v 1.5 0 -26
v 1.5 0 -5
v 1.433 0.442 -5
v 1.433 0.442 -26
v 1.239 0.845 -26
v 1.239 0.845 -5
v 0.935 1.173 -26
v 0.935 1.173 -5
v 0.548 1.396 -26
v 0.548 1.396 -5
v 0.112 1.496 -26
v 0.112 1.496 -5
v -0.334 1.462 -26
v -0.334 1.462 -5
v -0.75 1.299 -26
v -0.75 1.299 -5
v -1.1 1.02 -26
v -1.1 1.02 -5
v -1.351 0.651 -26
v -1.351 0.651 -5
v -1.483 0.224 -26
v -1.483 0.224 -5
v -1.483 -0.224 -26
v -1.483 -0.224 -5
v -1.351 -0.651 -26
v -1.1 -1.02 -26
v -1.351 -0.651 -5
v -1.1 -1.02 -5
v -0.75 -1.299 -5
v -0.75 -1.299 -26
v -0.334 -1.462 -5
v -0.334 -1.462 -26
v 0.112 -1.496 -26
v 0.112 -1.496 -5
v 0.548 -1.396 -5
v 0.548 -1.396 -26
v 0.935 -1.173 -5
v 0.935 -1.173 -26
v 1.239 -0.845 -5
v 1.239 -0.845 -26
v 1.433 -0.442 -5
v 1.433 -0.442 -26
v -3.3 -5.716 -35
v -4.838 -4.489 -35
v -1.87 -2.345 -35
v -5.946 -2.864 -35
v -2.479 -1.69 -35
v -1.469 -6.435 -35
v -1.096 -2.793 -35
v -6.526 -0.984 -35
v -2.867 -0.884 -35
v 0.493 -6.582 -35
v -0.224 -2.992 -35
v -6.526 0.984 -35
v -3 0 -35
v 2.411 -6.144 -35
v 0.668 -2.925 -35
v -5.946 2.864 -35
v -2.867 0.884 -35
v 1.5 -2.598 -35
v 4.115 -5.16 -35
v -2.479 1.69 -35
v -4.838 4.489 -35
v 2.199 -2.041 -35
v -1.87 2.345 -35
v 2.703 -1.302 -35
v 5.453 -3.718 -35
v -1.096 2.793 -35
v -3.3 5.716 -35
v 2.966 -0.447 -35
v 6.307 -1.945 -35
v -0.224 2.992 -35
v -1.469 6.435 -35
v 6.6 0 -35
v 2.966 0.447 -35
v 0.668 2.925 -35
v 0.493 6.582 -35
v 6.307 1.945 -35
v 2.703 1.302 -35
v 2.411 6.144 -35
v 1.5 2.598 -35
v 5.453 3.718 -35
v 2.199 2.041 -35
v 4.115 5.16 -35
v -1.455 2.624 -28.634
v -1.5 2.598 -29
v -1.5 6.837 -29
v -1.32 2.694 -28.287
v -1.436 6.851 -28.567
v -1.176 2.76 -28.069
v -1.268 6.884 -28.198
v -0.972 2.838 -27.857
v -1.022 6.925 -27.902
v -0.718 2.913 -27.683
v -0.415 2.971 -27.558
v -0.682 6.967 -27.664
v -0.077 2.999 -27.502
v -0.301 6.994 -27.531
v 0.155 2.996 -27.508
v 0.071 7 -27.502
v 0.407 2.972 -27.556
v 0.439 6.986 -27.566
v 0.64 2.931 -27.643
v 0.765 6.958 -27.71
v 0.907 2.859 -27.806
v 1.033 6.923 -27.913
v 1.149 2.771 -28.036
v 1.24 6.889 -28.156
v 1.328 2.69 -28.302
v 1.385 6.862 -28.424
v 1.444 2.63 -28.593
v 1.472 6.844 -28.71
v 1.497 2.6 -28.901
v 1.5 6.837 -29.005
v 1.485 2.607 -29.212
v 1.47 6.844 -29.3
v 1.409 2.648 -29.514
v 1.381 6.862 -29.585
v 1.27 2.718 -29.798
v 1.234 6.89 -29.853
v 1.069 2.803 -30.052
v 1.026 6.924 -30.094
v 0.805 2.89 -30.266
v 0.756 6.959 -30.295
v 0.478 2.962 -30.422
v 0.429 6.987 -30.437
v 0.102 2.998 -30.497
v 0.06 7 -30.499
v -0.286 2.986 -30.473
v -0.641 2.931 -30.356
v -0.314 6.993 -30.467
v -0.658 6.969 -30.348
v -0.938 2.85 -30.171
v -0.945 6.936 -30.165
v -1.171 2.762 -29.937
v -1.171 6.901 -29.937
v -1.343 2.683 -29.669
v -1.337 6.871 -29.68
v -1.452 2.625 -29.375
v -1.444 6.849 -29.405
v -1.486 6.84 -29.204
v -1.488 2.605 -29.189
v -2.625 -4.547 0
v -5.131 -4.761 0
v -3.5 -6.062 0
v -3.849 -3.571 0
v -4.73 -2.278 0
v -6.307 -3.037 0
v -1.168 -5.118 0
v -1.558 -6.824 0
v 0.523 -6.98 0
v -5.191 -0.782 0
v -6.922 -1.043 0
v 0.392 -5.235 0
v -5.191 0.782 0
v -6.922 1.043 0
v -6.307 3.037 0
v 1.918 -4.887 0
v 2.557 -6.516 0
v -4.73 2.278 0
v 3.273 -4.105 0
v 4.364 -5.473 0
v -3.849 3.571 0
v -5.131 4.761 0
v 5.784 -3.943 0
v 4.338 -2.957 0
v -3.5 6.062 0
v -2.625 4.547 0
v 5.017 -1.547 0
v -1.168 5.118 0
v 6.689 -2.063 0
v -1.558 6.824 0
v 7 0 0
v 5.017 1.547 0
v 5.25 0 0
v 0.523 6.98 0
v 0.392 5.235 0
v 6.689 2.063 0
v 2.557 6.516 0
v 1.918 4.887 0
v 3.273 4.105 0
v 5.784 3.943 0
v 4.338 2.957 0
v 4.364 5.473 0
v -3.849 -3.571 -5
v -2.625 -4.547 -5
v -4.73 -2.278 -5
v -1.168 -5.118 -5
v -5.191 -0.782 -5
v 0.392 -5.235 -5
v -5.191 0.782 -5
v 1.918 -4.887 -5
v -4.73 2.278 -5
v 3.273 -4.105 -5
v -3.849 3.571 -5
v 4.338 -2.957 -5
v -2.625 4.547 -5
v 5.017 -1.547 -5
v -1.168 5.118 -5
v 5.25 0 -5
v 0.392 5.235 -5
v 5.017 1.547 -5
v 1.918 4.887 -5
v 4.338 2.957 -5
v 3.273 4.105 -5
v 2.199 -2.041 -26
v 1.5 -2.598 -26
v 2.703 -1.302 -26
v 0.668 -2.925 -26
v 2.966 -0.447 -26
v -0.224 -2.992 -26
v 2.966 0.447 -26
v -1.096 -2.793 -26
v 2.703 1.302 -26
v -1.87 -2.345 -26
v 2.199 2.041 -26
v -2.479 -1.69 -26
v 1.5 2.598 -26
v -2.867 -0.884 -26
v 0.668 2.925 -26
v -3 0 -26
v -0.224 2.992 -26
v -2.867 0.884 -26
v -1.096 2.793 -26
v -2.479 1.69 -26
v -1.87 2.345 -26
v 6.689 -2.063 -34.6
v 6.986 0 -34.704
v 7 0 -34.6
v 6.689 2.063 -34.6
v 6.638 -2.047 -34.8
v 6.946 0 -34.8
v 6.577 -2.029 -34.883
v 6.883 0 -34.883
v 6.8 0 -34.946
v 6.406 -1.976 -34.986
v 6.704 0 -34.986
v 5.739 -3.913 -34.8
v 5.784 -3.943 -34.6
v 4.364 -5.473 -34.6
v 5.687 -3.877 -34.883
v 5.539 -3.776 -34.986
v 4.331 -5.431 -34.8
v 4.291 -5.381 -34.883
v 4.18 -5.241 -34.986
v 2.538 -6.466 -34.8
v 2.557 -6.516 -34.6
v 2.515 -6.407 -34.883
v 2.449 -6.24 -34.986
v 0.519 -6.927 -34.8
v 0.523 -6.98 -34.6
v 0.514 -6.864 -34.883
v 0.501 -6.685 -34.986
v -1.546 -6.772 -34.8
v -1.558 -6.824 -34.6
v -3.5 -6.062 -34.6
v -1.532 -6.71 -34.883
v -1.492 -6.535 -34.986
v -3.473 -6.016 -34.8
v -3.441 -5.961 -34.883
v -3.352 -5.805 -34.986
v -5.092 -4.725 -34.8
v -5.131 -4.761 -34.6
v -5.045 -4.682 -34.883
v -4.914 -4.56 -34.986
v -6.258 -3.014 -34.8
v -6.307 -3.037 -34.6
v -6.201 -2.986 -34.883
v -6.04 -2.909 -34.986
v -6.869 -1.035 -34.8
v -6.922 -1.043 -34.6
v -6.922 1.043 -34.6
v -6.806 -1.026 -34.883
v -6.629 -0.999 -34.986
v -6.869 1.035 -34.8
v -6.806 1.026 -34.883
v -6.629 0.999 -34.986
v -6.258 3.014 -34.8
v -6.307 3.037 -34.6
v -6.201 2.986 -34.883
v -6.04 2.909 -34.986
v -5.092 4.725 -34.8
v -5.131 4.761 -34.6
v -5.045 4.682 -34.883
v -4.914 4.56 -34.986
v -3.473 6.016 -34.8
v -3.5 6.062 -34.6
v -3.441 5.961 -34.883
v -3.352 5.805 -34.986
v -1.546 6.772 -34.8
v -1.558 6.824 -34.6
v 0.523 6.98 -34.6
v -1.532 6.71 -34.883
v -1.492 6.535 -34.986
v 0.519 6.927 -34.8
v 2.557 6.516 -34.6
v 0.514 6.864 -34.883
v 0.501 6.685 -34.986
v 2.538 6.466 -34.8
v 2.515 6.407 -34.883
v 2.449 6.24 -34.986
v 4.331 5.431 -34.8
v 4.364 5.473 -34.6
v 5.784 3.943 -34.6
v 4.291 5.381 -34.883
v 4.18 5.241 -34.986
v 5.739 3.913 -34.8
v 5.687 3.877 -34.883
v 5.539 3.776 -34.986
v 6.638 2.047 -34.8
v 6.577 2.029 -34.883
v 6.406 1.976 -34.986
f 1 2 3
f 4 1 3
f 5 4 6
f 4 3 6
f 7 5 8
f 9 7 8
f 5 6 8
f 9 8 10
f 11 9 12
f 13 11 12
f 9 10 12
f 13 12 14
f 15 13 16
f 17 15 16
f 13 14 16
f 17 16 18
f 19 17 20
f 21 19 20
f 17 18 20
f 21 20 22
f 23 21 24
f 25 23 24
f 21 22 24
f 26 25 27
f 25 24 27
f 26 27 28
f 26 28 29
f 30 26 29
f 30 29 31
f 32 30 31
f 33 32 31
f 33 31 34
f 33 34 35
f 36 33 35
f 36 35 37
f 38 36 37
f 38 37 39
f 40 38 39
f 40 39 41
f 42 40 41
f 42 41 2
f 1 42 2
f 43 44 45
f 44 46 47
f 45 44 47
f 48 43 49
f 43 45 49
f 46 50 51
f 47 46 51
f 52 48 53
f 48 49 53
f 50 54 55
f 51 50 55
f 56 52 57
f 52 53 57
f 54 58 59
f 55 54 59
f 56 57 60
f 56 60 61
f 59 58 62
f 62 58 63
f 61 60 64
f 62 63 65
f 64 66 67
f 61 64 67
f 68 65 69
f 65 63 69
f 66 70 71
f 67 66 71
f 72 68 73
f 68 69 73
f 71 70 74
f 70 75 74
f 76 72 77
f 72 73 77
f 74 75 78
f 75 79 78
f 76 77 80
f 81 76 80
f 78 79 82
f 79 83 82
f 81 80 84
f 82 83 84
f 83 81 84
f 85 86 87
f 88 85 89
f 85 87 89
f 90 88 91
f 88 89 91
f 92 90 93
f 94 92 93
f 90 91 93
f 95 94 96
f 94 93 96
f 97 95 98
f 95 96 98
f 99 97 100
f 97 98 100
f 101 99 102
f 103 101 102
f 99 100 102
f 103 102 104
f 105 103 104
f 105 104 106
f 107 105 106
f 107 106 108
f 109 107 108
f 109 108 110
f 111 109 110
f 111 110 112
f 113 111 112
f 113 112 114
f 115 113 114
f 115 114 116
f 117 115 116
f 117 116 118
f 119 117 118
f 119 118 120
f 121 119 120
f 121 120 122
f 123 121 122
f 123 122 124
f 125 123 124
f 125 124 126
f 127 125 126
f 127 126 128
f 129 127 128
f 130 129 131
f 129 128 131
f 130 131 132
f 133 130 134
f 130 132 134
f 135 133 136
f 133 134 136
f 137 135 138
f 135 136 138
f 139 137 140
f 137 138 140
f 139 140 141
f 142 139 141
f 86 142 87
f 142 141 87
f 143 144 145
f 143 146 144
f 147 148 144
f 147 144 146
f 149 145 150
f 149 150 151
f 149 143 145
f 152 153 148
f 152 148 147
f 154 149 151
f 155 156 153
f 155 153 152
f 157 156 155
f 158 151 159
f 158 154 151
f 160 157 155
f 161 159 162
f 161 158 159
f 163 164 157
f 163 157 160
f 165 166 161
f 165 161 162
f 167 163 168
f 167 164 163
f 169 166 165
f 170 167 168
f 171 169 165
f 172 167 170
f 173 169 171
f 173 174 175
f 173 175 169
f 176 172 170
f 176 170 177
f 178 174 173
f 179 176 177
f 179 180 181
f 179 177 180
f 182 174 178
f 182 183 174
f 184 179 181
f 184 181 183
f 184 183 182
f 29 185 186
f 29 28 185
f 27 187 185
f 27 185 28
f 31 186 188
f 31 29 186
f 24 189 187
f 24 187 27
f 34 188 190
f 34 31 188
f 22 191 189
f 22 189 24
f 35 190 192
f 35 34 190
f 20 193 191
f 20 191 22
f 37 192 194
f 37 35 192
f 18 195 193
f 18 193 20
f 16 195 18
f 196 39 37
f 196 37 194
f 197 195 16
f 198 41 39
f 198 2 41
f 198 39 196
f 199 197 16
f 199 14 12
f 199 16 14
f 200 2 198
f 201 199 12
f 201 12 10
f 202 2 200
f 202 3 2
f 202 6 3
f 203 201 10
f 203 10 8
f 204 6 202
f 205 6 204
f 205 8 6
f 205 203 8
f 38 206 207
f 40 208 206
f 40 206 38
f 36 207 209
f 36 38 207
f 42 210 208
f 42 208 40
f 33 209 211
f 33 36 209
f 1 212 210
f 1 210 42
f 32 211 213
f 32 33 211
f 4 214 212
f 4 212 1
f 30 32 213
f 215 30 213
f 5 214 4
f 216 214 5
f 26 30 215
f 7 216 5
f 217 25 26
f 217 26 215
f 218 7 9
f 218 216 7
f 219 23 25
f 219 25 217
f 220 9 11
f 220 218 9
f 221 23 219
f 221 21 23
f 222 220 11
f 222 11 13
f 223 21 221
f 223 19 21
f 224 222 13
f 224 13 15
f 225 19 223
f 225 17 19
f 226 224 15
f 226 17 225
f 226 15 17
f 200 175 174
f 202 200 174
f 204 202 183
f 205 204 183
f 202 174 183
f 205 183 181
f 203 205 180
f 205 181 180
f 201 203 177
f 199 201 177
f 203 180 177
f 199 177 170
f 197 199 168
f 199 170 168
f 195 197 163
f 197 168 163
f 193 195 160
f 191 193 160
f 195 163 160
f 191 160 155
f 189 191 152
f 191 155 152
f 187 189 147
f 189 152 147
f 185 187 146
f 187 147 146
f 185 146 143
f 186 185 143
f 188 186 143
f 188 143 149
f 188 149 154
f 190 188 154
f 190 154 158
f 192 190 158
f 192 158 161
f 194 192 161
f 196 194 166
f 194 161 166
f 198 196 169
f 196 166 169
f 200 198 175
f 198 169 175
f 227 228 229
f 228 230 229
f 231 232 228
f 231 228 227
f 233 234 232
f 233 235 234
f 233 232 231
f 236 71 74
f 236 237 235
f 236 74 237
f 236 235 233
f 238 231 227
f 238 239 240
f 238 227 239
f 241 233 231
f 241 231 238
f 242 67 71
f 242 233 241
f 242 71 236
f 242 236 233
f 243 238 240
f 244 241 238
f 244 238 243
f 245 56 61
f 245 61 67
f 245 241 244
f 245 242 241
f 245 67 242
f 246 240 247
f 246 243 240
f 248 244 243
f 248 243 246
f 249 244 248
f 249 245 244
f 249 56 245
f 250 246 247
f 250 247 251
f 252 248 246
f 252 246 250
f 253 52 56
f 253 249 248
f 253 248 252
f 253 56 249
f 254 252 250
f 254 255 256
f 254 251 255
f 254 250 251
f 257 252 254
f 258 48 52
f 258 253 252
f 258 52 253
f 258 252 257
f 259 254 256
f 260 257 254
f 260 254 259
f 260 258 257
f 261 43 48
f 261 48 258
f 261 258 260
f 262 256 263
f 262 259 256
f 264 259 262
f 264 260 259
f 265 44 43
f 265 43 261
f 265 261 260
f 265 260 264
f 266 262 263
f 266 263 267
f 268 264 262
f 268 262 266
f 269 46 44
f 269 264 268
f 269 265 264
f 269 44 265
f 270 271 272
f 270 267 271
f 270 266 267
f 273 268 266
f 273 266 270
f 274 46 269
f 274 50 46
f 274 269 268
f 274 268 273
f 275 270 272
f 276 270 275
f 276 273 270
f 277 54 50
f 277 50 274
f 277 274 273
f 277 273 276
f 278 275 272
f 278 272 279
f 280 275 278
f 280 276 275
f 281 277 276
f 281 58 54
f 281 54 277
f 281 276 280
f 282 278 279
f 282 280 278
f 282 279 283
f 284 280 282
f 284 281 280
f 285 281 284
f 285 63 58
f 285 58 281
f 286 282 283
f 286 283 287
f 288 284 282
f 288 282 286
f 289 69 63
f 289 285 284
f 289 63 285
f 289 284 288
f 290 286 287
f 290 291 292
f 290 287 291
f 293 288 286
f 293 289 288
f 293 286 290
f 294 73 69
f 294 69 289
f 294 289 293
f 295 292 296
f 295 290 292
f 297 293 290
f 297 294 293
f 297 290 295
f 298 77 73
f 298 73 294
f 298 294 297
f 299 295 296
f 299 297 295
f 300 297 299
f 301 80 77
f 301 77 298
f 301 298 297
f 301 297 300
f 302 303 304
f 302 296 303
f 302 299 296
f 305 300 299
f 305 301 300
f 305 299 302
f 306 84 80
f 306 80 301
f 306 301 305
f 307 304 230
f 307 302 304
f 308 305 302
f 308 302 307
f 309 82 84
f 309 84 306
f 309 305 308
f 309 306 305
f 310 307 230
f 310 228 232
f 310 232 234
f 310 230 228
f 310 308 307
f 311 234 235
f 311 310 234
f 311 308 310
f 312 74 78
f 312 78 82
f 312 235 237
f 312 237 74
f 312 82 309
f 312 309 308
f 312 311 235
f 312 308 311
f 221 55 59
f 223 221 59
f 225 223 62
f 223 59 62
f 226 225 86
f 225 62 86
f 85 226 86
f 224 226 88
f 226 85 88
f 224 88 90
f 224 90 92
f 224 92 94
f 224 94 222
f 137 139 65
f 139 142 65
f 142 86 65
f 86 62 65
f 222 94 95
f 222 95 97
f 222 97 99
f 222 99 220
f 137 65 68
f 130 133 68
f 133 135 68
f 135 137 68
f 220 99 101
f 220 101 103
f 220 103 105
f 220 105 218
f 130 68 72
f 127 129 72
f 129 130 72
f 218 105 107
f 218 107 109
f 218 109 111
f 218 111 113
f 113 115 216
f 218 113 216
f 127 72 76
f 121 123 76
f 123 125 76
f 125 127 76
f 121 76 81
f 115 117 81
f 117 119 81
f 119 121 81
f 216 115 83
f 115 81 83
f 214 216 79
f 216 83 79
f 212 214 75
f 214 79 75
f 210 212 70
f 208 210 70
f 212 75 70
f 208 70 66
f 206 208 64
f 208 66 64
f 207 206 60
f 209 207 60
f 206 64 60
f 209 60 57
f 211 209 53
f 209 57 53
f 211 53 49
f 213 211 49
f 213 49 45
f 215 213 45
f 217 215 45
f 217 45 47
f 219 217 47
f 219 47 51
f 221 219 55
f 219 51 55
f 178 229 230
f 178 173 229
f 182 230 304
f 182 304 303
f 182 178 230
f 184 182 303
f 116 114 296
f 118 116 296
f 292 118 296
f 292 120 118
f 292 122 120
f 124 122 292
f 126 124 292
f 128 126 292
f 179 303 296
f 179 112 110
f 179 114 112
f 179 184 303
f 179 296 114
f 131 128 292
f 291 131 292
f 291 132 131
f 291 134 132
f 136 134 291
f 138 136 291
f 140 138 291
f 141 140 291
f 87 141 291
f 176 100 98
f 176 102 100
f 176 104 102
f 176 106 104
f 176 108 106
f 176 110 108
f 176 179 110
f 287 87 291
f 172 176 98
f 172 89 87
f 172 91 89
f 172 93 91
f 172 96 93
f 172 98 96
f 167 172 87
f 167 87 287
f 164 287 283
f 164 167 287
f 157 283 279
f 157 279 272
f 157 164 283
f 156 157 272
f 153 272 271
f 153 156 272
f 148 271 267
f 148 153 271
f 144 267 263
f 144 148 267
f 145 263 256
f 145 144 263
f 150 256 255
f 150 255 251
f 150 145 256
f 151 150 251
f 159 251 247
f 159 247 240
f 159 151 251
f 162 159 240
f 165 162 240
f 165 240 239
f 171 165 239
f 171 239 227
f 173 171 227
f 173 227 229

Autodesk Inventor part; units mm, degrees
ref_plane "YZ Plane" through (0, 0, 0) normal (1, 0, 0) x (0, 1, 0)
ref_plane "XY Plane" through (0, 0, 0) normal (0, 0, 1) x (1, 0, 0)
sketch "Sketch1" plane through (0, 0, 0) normal (0, 0, 1) x (1, 0, 0)
  circle A0 centre (0, 0) radius 7
extrude "Extrusion1" add sketch "Sketch1" against normal blind 35
sketch "Sketch2" plane through (0, 0, 0) normal (0, 0, 1) x (1, 0, 0)
  circle A0 centre (0, 0) radius 7 projected
  circle A1 centre (0, 0) radius 5.25
extrude "Extrusion2" cut sketch "Sketch2" against normal blind 5 contours A1
sketch "Sketch3" plane through (0, 0, -5) normal (0, 0, 1) x (1, 0, 0)
  circle A0 centre (0, 0) radius 5.25 projected
  circle A1 centre (0, 0) radius 1.5
extrude "Extrusion3" cut sketch "Sketch3" against normal blind 30 contours A1
sketch "Sketch4" plane through (0, 0, -35) normal (0, 0, -1) x (-1, 0, 0)
  circle A0 centre (0, 0) radius 1.5 projected
  circle A1 centre (0, 0) radius 7 projected
  circle A2 centre (0, 0) radius 1.5
  circle A3 centre (0, 0) radius 3
extrude "Extrusion4" cut sketch "Sketch4" against normal blind 9 contours A3
ref_plane "Work Plane1" through (0, 9, 0) normal (0, 1, 0) x (-1, 0, 0)
sketch "Sketch5" plane through (0, 9, 0) normal (0, 1, 0) x (-1, 0, 0)
  line L0 (3, -35) -> (-3, -35) projected
  line L1 (-7, -35) -> (7, -35) projected
  circle A0 centre (0, -29) radius 1.5
  point P0 (0, 0)
extrude "Extrusion5" cut sketch "Sketch5" against normal blind 9
thread "Thread1" size "M3x0.5" class "6H" standard "ANSI Metric M Profile" full length
fillet "Fillet1" radius 0.4 1 edges at (-7, 0, -35)
properties part number "Shaft"
